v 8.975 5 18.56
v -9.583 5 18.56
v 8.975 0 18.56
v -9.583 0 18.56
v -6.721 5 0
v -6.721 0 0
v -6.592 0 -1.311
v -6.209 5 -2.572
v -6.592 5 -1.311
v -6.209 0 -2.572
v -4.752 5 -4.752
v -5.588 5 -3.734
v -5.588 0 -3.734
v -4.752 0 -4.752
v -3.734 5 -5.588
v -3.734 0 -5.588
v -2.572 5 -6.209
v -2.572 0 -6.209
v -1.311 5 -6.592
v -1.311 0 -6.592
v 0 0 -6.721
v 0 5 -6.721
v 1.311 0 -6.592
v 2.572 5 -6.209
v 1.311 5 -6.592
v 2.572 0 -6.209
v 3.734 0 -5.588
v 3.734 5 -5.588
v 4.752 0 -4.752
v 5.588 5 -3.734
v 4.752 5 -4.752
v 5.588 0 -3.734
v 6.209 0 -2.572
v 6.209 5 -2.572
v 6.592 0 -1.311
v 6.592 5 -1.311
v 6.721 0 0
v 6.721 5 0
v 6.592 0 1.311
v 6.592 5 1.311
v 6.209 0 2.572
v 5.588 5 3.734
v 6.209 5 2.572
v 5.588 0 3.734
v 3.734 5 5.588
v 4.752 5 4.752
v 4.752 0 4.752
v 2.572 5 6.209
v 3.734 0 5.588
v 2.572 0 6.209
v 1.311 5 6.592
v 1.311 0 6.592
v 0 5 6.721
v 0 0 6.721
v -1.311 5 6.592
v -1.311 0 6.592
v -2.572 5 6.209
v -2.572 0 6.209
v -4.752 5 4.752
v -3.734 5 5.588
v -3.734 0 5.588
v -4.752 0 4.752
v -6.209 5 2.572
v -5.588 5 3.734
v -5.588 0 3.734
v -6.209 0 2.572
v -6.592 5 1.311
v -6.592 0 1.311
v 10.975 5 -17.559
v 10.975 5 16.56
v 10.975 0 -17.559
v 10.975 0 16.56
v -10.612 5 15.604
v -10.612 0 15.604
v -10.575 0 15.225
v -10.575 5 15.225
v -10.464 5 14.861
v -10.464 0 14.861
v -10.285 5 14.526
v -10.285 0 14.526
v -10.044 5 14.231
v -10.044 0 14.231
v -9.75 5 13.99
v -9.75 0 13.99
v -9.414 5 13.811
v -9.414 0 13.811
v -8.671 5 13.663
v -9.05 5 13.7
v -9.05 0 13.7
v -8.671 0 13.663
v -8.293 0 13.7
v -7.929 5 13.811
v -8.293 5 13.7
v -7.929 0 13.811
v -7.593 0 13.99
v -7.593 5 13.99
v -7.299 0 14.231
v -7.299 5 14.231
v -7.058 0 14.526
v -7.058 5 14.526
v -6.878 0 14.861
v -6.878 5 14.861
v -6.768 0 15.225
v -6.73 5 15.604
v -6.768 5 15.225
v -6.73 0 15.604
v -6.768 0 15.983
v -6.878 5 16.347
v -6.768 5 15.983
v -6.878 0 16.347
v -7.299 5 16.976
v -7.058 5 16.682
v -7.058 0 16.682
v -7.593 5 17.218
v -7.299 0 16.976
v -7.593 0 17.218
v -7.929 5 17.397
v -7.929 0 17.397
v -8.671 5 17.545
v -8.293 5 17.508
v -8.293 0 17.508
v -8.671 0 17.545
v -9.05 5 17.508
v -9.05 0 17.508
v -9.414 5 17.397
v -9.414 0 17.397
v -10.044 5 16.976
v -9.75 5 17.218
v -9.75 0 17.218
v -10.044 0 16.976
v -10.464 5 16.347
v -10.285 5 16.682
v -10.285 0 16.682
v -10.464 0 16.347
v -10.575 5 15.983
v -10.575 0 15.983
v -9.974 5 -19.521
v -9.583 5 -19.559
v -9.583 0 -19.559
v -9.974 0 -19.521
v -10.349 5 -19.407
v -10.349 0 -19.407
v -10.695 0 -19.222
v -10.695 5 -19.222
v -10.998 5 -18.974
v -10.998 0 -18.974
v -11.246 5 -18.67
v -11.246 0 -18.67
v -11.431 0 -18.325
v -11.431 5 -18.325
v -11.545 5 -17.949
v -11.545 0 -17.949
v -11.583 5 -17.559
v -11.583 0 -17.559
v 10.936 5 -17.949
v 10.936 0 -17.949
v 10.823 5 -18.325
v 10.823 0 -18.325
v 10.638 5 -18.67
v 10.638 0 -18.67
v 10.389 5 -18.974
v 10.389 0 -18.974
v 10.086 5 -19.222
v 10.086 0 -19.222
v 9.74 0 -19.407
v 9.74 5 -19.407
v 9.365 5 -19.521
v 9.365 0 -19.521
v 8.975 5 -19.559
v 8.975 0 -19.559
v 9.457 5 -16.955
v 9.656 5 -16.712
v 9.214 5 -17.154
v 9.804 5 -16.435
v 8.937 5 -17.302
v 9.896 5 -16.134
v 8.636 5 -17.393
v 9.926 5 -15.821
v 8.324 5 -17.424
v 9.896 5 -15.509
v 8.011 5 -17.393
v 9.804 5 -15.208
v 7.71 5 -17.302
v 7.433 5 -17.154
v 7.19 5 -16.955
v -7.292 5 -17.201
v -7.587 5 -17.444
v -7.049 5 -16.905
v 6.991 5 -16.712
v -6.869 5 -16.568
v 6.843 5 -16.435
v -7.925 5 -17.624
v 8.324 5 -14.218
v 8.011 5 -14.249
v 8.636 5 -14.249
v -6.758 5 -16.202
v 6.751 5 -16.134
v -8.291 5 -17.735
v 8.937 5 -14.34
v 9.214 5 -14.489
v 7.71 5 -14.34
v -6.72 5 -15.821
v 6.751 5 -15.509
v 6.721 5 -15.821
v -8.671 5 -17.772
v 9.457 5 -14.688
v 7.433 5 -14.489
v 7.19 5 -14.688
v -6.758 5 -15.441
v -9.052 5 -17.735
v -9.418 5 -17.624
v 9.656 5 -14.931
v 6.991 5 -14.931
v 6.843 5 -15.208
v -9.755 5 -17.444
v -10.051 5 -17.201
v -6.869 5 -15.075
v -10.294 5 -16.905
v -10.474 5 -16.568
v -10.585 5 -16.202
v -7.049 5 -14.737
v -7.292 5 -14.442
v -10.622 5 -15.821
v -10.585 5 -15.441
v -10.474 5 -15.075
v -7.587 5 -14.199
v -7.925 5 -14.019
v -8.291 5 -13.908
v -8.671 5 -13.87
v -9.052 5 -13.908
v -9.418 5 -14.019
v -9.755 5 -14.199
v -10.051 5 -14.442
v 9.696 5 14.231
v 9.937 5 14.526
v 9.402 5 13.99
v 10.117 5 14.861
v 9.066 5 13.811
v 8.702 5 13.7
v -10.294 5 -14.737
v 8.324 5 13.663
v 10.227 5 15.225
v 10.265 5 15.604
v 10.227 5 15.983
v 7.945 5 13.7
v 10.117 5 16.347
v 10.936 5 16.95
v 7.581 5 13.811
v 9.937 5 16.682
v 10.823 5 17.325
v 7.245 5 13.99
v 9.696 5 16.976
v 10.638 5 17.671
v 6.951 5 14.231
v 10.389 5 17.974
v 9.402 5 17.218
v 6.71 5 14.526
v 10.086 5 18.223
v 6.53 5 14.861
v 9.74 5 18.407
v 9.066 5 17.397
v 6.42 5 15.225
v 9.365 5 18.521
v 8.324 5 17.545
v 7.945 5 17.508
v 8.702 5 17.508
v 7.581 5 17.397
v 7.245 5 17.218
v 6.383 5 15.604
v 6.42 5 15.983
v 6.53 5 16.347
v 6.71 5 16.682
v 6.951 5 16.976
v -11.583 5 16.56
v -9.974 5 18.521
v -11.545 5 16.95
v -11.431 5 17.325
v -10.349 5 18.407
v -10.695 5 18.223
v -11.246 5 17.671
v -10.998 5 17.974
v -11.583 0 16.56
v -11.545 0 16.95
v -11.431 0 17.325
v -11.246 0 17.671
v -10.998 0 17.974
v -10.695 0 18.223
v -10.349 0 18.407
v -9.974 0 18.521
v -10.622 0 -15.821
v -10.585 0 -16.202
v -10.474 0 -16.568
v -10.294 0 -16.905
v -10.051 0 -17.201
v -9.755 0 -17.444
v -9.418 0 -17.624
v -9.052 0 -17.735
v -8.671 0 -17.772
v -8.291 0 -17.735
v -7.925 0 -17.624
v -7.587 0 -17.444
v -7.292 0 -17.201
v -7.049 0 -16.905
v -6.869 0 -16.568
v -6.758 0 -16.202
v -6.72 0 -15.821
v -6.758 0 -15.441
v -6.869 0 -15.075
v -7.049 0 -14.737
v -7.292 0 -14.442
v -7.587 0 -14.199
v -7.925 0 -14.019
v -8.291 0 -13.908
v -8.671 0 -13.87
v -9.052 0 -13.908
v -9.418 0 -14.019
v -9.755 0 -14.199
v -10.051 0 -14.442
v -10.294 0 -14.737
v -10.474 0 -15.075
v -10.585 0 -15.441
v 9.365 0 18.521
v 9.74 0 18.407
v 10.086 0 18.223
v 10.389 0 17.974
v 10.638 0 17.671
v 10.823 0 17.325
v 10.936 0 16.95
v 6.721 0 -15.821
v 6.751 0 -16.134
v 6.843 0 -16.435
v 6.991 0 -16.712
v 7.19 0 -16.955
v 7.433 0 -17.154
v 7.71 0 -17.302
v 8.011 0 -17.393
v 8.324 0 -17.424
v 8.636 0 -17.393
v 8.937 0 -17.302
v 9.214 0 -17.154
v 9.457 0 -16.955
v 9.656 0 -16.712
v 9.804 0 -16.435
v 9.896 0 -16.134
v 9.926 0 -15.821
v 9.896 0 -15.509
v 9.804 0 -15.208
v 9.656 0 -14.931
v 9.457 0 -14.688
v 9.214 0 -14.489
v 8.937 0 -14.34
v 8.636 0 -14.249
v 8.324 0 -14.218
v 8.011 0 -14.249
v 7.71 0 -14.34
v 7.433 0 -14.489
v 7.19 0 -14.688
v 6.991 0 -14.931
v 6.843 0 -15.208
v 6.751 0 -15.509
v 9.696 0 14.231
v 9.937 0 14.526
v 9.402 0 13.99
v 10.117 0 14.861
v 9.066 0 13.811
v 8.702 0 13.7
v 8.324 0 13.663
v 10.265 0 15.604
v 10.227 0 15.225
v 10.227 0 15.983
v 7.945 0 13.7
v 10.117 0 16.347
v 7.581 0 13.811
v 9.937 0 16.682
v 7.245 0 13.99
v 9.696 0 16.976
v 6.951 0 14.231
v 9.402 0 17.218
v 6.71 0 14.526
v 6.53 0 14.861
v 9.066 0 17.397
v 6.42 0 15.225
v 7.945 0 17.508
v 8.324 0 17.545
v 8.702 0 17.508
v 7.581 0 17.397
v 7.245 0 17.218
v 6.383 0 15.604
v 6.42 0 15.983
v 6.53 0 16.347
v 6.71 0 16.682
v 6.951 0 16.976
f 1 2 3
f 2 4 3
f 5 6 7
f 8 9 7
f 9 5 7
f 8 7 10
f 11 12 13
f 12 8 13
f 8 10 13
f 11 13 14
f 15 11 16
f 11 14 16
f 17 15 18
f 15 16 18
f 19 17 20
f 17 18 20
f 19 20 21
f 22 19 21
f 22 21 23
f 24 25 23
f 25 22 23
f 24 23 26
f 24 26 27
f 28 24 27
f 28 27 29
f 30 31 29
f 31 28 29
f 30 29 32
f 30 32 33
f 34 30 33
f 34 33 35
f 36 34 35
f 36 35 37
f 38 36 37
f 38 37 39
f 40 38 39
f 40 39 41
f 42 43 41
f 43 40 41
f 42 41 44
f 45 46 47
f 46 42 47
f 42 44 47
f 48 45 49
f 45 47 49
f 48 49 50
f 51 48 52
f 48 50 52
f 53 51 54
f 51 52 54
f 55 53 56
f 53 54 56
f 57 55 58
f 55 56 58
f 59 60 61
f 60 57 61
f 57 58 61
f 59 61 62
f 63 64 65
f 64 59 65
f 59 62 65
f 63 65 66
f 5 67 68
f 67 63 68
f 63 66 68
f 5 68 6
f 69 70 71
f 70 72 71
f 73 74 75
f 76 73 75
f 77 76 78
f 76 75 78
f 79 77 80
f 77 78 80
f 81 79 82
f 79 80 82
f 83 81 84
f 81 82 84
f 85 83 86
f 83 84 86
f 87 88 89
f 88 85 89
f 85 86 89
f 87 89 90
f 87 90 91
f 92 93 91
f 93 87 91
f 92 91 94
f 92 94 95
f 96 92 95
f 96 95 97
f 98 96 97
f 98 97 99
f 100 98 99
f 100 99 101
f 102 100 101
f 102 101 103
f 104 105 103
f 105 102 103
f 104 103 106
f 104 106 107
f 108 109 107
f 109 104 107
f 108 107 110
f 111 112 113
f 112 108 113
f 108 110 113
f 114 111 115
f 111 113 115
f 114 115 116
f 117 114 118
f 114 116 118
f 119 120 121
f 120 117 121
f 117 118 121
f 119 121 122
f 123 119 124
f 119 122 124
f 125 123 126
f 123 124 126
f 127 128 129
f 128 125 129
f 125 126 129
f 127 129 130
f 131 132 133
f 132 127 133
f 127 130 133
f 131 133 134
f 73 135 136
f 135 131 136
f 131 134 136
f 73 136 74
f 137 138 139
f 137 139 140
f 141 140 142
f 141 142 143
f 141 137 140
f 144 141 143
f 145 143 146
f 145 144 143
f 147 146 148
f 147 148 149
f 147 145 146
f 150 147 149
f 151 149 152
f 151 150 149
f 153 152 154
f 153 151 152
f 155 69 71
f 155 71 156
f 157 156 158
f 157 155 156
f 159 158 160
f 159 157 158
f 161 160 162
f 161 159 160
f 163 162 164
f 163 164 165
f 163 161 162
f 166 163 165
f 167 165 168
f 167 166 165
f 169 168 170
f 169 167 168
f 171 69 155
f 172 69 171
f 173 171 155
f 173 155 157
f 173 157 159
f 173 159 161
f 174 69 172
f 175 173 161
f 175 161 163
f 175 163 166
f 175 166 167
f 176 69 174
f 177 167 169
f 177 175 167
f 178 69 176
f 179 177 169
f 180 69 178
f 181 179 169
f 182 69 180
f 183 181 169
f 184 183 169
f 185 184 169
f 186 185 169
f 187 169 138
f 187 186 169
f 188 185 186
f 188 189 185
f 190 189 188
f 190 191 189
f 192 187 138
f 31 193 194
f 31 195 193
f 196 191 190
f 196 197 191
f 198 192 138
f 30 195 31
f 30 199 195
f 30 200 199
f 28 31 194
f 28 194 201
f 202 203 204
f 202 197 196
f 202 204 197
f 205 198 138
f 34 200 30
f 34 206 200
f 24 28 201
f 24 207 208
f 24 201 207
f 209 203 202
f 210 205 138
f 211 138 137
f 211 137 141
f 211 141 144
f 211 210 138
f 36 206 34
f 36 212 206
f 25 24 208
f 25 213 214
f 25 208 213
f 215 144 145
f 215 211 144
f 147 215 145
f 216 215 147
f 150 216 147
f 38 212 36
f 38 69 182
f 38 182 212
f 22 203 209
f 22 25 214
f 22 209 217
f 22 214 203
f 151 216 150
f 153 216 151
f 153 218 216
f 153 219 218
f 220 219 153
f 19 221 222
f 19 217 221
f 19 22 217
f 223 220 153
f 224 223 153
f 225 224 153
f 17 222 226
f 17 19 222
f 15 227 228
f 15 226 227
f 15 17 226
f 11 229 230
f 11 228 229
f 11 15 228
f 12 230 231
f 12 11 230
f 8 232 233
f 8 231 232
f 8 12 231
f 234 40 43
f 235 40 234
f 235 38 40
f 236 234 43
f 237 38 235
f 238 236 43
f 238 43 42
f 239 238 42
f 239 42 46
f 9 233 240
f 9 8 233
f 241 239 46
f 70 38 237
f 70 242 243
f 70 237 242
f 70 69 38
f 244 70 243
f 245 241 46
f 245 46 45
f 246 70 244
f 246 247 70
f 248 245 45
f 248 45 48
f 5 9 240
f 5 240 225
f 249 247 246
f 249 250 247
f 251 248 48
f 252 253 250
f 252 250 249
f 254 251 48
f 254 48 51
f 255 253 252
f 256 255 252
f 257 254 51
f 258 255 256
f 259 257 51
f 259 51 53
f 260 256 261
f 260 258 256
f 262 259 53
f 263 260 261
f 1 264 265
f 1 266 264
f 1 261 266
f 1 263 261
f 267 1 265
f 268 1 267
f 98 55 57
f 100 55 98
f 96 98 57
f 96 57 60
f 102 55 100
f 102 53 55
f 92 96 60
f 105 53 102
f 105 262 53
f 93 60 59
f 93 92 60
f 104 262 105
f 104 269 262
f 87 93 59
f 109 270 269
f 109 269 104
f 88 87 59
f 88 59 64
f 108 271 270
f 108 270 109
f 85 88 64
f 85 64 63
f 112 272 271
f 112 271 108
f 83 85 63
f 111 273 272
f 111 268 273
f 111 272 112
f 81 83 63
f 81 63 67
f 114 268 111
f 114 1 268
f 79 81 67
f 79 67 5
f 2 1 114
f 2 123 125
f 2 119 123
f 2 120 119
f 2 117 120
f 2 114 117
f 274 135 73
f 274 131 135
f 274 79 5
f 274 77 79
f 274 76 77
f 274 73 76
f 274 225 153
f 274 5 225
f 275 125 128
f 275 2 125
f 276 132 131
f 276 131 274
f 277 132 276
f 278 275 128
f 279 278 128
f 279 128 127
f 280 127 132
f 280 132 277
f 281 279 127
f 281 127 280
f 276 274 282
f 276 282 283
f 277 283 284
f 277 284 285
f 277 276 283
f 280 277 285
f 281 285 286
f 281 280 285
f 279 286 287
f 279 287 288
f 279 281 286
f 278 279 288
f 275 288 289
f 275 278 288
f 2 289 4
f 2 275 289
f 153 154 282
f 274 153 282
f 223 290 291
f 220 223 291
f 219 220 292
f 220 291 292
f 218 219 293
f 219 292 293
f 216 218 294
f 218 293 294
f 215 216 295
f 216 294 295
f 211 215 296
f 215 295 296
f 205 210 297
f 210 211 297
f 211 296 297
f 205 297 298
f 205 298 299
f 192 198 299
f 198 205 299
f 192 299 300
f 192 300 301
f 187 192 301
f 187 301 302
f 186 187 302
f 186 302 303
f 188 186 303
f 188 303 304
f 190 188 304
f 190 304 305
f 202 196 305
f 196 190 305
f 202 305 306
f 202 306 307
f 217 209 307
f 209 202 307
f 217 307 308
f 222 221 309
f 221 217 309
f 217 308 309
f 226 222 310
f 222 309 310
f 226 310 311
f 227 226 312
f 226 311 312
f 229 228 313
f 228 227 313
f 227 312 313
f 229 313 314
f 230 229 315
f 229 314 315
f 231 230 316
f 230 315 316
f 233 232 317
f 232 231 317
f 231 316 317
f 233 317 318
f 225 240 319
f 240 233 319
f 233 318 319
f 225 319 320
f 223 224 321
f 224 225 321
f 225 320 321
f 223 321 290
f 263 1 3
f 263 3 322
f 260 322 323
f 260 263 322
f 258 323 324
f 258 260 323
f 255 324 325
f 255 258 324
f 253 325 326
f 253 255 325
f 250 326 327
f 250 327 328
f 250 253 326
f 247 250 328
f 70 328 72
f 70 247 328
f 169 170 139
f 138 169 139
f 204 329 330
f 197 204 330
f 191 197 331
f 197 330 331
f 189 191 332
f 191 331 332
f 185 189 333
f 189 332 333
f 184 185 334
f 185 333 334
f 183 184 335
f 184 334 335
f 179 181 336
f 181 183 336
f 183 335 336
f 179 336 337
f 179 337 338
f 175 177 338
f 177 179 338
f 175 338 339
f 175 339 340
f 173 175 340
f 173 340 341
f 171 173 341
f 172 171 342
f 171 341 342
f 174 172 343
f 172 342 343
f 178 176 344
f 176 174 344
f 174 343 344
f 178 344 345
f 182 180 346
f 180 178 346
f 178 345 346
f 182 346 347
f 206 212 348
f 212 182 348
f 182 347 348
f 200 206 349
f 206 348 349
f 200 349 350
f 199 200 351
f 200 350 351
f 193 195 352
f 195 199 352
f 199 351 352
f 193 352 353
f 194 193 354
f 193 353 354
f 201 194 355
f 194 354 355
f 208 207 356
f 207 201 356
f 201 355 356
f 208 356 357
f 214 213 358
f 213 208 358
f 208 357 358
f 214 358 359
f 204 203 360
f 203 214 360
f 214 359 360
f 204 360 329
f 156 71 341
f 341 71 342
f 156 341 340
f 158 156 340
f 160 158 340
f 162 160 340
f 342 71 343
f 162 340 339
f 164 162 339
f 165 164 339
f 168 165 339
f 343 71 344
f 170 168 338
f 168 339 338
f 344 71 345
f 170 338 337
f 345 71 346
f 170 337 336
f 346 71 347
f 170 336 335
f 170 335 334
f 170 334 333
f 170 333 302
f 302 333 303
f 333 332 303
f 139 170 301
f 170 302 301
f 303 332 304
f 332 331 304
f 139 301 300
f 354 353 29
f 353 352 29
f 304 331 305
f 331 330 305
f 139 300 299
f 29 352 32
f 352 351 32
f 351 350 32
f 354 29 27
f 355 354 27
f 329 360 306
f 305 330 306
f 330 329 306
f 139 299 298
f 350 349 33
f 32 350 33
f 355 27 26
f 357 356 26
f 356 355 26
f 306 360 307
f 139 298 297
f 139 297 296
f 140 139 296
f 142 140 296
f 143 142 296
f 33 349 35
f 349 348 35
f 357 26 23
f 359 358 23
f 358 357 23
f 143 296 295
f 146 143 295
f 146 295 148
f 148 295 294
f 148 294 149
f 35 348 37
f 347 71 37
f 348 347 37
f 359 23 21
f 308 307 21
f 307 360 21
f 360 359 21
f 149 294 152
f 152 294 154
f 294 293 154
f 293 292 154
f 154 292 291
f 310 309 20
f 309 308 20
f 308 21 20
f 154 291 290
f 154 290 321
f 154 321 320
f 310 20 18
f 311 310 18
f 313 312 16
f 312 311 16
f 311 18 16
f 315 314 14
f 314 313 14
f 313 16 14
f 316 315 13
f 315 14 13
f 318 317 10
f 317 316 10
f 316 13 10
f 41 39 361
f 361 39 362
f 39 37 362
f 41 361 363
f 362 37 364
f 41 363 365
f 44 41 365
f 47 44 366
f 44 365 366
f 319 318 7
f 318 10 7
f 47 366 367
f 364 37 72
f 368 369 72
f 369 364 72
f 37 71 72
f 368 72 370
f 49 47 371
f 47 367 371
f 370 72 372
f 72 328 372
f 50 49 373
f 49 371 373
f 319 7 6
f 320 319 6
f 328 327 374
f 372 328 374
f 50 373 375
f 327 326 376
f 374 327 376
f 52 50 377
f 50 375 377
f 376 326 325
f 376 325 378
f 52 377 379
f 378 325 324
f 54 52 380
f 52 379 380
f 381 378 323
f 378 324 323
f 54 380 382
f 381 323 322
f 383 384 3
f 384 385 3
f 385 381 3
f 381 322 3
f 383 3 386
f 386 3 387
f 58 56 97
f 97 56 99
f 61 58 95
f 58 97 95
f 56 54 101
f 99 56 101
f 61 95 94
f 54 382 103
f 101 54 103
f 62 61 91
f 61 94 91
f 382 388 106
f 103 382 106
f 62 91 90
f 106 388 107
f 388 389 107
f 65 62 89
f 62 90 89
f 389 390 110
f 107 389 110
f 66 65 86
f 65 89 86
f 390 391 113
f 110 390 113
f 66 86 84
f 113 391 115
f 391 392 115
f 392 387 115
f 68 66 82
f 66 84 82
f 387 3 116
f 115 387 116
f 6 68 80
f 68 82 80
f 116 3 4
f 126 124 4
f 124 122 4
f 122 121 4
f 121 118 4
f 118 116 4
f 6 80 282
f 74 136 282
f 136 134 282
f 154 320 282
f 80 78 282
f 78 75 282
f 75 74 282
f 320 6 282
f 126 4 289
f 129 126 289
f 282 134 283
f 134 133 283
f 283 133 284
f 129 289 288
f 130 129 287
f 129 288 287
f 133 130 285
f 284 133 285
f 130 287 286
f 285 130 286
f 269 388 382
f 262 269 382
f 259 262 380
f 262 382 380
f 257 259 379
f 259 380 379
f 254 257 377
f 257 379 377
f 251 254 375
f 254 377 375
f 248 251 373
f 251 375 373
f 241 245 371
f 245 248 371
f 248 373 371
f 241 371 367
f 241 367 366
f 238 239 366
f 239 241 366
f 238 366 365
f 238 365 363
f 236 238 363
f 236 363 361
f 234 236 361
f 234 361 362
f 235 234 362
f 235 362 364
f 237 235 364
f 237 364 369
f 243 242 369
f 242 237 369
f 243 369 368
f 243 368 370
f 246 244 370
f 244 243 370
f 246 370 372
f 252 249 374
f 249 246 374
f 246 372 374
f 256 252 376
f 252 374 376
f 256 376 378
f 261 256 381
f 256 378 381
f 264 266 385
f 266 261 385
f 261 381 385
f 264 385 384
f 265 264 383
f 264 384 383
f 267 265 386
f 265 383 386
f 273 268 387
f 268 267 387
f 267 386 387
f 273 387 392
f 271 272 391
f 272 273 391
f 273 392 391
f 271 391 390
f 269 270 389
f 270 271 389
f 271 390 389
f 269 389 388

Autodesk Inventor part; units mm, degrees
ref_plane "YZ Plane" through (0, 0, 0) normal (1, 0, 0) x (0, 1, 0)
ref_plane "XZ Plane" through (0, 0, 0) normal (0, 1, 0) x (-1, 0, 0)
ref_plane "XY Plane" through (0, 0, 0) normal (0, 0, 1) x (1, 0, 0)
sketch "Sketch2" plane through (0, 0, 0) normal (0, 1, 0) x (-1, 0, 0)
  line L0 (11.5834, 18.5596) -> (-10.9749, 18.5596)
  line L1 (-10.9749, 18.5596) -> (-10.9749, -19.5593)
  line L2 (-10.9749, -19.5593) -> (11.5834, -19.5593)
  line L3 (11.5834, -19.5593) -> (11.5834, 18.5596)
  circle A0 centre (8.6713, 15.6039) radius 1.9409
  circle A1 centre (0, 0) radius 6.7207
  circle A2 centre (-8.3236, 15.6039) radius 1.9409
  circle A3 centre (8.6713, -15.8213) radius 1.9511
  circle A4 centre (-8.3236, -15.8213) radius 1.6029
extrude "Extrusion2" add sketch "Sketch2" along normal blind 5
fillet "Fillet1" radius 2 1 edges at (-11.5834, 2.5, 18.5596)
fillet "Fillet2" radius 2 1 edges at (10.9749, 2.5, 18.5596)
fillet "Fillet3" radius 2 1 edges at (10.9749, 2.5, -19.5593)
fillet "Fillet4" radius 2 1 edges at (-11.5834, 2.5, -19.5593)
properties part number "Bloque-Part"
